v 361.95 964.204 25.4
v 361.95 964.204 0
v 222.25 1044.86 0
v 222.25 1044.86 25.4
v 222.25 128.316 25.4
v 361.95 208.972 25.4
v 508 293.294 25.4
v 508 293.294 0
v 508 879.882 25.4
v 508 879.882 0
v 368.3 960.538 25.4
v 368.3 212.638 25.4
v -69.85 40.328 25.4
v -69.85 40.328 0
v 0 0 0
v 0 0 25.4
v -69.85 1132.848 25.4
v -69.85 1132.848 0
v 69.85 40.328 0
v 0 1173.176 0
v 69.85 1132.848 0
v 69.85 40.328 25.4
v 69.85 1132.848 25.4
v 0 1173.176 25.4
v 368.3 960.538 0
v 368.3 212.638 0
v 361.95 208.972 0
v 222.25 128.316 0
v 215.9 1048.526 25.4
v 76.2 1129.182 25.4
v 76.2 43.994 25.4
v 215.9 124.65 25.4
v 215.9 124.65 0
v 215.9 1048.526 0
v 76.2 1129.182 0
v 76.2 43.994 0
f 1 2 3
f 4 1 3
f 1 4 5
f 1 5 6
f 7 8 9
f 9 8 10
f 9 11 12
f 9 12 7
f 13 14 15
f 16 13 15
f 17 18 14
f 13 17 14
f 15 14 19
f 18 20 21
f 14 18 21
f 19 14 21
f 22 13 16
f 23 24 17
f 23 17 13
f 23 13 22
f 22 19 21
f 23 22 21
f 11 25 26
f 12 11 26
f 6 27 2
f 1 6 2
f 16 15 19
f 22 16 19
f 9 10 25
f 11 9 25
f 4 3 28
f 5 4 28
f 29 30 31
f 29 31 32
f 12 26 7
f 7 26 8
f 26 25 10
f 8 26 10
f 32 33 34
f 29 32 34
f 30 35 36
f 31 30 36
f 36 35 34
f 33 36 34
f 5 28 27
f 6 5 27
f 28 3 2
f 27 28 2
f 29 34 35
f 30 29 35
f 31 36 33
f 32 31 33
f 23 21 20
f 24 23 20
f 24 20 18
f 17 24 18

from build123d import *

# Parameters (mm, degrees)
F1_DEPTH = 25.4
F3_DEPTH = 25.4
F5_DEPTH = 25.4
F7_DEPTH = 25.4


with BuildPart() as f1:
    # F0 (on Top) → F1 (new body)
    with BuildSketch(Plane.XY):
        Polygon((-69.85, 40.327916), (0, 0), (69.85, 40.327916), (69.85, 1132.847831), (0, 1173.175747), (-69.85, 1132.847831), align=None)
    extrude(amount=F1_DEPTH)


with BuildPart() as f3:
    # F2 (on Top) → F3 (new body)
    with BuildSketch(Plane.XY):
        Polygon((76.2, 1129.181656), (76.2, 43.994091), (215.9, 124.649923), (215.9, 1048.525824), align=None)
    extrude(amount=F3_DEPTH)


with BuildPart() as f5:
    # F4 (on Top) → F5 (new body)
    with BuildSketch(Plane.XY):
        Polygon((361.95, 964.203817), (222.25, 1044.85965), (222.25, 128.316097), (361.95, 208.97193), align=None)
    extrude(amount=F5_DEPTH)


with BuildPart() as f7:
    # F6 (on Top) → F7 (new body)
    with BuildSketch(Plane.XY):
        Polygon((368.3, 960.537643), (368.3, 212.638104), (508, 293.293937), (508, 879.88181), align=None)
    extrude(amount=F7_DEPTH)


solid = Compound([f1.part, f3.part, f5.part, f7.part])
